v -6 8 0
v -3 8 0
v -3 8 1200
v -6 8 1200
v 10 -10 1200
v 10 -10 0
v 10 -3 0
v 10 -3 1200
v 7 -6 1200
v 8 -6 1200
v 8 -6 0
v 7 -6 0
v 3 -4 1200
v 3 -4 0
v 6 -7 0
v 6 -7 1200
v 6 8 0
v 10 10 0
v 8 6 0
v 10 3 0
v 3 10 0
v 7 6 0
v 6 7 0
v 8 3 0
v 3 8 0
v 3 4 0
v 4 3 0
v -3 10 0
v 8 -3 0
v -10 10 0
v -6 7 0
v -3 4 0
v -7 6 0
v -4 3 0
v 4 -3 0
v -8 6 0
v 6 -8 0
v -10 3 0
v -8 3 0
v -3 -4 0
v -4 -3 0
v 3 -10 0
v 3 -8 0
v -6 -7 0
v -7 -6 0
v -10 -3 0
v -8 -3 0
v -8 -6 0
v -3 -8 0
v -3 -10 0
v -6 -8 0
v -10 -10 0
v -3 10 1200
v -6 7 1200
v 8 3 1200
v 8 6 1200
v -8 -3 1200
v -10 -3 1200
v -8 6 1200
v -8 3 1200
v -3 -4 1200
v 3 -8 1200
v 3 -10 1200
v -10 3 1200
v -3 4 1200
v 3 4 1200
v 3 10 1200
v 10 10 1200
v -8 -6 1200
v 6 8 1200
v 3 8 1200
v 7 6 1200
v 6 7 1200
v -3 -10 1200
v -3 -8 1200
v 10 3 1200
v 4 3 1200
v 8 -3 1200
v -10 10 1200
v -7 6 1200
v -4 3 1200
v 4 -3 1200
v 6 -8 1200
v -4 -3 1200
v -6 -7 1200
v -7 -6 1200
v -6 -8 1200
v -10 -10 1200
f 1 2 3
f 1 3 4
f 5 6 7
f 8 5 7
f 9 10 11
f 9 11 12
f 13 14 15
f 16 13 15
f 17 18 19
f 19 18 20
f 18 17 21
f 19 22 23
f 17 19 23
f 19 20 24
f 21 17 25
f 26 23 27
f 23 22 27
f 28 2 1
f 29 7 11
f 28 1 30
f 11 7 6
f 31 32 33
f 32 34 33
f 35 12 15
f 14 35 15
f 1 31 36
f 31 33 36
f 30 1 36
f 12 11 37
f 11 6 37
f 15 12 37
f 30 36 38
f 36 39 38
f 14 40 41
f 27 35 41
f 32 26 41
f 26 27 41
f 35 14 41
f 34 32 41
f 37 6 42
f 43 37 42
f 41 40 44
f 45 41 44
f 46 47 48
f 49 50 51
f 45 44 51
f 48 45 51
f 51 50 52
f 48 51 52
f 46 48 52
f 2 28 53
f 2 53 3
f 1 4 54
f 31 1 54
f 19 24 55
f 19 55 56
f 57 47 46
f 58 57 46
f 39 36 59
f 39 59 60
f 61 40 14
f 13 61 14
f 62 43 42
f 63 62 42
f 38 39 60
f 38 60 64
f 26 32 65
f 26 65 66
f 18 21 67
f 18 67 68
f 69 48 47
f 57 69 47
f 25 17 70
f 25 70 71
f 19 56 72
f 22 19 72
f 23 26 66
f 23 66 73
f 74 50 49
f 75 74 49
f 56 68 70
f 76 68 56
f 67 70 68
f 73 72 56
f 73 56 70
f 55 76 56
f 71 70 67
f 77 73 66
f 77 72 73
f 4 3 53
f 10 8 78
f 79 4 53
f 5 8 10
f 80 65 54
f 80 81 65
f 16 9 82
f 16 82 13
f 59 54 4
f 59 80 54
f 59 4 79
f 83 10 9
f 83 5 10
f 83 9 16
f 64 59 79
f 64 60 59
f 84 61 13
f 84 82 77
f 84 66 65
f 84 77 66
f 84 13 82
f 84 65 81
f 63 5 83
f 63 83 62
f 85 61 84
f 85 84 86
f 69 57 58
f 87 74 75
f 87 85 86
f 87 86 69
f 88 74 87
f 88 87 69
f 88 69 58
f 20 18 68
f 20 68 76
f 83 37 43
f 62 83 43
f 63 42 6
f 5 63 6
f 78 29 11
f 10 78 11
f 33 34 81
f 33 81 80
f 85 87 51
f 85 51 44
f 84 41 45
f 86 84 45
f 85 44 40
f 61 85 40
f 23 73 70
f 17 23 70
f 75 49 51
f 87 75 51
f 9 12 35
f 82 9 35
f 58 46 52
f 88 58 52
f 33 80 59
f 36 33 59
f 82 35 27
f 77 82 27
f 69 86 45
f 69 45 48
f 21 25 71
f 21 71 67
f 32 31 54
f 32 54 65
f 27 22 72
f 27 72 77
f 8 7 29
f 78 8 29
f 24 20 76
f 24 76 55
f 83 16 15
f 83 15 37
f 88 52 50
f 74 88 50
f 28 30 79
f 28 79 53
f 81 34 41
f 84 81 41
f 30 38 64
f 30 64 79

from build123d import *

# Parameters (mm, degrees)
PAD_DEPTH    = 1200
SKETCH001_R  = 2
POCKET_DEPTH = 4.001


with BuildPart() as change_me_for_height:
    # Sketch → Pad (new body)
    with BuildSketch(Plane.XY):
        Polygon((-10, 3), (-10, 10), (-3, 10), (-3, 8), (-6, 8), (-6, 7), (-3, 4), (3, 4), (6, 7), (6, 8), (3, 8), (3, 10), (10, 10), (10, 3), (8, 3), (8, 6), (7, 6), (4, 3), (4, 0), (-4, 0), (-4, 3), (-7, 6), (-8, 6), (-8, 3), align=None)
    pad = extrude(amount=PAD_DEPTH)


with BuildPart() as mirrored:
    # Mirrored base: copy of Change_me_for_height
    add(change_me_for_height.part)

    # Mirrored: Pad across Sketch H_Axis
    add(pad.mirror(Plane.ZX))


with BuildPart() as pocket:
    # Fusion base: copy of Change_me_for_height
    add(change_me_for_height.part)

    # Fusion: union Mirrored
    add(mirrored.part)

    # Sketch001 → Pocket (cut, through all)
    with BuildSketch(Plane.XZ.offset(-6)):
        Circle(SKETCH001_R)
    extrude(amount=-POCKET_DEPTH, mode=Mode.SUBTRACT)


solid = pocket.part
